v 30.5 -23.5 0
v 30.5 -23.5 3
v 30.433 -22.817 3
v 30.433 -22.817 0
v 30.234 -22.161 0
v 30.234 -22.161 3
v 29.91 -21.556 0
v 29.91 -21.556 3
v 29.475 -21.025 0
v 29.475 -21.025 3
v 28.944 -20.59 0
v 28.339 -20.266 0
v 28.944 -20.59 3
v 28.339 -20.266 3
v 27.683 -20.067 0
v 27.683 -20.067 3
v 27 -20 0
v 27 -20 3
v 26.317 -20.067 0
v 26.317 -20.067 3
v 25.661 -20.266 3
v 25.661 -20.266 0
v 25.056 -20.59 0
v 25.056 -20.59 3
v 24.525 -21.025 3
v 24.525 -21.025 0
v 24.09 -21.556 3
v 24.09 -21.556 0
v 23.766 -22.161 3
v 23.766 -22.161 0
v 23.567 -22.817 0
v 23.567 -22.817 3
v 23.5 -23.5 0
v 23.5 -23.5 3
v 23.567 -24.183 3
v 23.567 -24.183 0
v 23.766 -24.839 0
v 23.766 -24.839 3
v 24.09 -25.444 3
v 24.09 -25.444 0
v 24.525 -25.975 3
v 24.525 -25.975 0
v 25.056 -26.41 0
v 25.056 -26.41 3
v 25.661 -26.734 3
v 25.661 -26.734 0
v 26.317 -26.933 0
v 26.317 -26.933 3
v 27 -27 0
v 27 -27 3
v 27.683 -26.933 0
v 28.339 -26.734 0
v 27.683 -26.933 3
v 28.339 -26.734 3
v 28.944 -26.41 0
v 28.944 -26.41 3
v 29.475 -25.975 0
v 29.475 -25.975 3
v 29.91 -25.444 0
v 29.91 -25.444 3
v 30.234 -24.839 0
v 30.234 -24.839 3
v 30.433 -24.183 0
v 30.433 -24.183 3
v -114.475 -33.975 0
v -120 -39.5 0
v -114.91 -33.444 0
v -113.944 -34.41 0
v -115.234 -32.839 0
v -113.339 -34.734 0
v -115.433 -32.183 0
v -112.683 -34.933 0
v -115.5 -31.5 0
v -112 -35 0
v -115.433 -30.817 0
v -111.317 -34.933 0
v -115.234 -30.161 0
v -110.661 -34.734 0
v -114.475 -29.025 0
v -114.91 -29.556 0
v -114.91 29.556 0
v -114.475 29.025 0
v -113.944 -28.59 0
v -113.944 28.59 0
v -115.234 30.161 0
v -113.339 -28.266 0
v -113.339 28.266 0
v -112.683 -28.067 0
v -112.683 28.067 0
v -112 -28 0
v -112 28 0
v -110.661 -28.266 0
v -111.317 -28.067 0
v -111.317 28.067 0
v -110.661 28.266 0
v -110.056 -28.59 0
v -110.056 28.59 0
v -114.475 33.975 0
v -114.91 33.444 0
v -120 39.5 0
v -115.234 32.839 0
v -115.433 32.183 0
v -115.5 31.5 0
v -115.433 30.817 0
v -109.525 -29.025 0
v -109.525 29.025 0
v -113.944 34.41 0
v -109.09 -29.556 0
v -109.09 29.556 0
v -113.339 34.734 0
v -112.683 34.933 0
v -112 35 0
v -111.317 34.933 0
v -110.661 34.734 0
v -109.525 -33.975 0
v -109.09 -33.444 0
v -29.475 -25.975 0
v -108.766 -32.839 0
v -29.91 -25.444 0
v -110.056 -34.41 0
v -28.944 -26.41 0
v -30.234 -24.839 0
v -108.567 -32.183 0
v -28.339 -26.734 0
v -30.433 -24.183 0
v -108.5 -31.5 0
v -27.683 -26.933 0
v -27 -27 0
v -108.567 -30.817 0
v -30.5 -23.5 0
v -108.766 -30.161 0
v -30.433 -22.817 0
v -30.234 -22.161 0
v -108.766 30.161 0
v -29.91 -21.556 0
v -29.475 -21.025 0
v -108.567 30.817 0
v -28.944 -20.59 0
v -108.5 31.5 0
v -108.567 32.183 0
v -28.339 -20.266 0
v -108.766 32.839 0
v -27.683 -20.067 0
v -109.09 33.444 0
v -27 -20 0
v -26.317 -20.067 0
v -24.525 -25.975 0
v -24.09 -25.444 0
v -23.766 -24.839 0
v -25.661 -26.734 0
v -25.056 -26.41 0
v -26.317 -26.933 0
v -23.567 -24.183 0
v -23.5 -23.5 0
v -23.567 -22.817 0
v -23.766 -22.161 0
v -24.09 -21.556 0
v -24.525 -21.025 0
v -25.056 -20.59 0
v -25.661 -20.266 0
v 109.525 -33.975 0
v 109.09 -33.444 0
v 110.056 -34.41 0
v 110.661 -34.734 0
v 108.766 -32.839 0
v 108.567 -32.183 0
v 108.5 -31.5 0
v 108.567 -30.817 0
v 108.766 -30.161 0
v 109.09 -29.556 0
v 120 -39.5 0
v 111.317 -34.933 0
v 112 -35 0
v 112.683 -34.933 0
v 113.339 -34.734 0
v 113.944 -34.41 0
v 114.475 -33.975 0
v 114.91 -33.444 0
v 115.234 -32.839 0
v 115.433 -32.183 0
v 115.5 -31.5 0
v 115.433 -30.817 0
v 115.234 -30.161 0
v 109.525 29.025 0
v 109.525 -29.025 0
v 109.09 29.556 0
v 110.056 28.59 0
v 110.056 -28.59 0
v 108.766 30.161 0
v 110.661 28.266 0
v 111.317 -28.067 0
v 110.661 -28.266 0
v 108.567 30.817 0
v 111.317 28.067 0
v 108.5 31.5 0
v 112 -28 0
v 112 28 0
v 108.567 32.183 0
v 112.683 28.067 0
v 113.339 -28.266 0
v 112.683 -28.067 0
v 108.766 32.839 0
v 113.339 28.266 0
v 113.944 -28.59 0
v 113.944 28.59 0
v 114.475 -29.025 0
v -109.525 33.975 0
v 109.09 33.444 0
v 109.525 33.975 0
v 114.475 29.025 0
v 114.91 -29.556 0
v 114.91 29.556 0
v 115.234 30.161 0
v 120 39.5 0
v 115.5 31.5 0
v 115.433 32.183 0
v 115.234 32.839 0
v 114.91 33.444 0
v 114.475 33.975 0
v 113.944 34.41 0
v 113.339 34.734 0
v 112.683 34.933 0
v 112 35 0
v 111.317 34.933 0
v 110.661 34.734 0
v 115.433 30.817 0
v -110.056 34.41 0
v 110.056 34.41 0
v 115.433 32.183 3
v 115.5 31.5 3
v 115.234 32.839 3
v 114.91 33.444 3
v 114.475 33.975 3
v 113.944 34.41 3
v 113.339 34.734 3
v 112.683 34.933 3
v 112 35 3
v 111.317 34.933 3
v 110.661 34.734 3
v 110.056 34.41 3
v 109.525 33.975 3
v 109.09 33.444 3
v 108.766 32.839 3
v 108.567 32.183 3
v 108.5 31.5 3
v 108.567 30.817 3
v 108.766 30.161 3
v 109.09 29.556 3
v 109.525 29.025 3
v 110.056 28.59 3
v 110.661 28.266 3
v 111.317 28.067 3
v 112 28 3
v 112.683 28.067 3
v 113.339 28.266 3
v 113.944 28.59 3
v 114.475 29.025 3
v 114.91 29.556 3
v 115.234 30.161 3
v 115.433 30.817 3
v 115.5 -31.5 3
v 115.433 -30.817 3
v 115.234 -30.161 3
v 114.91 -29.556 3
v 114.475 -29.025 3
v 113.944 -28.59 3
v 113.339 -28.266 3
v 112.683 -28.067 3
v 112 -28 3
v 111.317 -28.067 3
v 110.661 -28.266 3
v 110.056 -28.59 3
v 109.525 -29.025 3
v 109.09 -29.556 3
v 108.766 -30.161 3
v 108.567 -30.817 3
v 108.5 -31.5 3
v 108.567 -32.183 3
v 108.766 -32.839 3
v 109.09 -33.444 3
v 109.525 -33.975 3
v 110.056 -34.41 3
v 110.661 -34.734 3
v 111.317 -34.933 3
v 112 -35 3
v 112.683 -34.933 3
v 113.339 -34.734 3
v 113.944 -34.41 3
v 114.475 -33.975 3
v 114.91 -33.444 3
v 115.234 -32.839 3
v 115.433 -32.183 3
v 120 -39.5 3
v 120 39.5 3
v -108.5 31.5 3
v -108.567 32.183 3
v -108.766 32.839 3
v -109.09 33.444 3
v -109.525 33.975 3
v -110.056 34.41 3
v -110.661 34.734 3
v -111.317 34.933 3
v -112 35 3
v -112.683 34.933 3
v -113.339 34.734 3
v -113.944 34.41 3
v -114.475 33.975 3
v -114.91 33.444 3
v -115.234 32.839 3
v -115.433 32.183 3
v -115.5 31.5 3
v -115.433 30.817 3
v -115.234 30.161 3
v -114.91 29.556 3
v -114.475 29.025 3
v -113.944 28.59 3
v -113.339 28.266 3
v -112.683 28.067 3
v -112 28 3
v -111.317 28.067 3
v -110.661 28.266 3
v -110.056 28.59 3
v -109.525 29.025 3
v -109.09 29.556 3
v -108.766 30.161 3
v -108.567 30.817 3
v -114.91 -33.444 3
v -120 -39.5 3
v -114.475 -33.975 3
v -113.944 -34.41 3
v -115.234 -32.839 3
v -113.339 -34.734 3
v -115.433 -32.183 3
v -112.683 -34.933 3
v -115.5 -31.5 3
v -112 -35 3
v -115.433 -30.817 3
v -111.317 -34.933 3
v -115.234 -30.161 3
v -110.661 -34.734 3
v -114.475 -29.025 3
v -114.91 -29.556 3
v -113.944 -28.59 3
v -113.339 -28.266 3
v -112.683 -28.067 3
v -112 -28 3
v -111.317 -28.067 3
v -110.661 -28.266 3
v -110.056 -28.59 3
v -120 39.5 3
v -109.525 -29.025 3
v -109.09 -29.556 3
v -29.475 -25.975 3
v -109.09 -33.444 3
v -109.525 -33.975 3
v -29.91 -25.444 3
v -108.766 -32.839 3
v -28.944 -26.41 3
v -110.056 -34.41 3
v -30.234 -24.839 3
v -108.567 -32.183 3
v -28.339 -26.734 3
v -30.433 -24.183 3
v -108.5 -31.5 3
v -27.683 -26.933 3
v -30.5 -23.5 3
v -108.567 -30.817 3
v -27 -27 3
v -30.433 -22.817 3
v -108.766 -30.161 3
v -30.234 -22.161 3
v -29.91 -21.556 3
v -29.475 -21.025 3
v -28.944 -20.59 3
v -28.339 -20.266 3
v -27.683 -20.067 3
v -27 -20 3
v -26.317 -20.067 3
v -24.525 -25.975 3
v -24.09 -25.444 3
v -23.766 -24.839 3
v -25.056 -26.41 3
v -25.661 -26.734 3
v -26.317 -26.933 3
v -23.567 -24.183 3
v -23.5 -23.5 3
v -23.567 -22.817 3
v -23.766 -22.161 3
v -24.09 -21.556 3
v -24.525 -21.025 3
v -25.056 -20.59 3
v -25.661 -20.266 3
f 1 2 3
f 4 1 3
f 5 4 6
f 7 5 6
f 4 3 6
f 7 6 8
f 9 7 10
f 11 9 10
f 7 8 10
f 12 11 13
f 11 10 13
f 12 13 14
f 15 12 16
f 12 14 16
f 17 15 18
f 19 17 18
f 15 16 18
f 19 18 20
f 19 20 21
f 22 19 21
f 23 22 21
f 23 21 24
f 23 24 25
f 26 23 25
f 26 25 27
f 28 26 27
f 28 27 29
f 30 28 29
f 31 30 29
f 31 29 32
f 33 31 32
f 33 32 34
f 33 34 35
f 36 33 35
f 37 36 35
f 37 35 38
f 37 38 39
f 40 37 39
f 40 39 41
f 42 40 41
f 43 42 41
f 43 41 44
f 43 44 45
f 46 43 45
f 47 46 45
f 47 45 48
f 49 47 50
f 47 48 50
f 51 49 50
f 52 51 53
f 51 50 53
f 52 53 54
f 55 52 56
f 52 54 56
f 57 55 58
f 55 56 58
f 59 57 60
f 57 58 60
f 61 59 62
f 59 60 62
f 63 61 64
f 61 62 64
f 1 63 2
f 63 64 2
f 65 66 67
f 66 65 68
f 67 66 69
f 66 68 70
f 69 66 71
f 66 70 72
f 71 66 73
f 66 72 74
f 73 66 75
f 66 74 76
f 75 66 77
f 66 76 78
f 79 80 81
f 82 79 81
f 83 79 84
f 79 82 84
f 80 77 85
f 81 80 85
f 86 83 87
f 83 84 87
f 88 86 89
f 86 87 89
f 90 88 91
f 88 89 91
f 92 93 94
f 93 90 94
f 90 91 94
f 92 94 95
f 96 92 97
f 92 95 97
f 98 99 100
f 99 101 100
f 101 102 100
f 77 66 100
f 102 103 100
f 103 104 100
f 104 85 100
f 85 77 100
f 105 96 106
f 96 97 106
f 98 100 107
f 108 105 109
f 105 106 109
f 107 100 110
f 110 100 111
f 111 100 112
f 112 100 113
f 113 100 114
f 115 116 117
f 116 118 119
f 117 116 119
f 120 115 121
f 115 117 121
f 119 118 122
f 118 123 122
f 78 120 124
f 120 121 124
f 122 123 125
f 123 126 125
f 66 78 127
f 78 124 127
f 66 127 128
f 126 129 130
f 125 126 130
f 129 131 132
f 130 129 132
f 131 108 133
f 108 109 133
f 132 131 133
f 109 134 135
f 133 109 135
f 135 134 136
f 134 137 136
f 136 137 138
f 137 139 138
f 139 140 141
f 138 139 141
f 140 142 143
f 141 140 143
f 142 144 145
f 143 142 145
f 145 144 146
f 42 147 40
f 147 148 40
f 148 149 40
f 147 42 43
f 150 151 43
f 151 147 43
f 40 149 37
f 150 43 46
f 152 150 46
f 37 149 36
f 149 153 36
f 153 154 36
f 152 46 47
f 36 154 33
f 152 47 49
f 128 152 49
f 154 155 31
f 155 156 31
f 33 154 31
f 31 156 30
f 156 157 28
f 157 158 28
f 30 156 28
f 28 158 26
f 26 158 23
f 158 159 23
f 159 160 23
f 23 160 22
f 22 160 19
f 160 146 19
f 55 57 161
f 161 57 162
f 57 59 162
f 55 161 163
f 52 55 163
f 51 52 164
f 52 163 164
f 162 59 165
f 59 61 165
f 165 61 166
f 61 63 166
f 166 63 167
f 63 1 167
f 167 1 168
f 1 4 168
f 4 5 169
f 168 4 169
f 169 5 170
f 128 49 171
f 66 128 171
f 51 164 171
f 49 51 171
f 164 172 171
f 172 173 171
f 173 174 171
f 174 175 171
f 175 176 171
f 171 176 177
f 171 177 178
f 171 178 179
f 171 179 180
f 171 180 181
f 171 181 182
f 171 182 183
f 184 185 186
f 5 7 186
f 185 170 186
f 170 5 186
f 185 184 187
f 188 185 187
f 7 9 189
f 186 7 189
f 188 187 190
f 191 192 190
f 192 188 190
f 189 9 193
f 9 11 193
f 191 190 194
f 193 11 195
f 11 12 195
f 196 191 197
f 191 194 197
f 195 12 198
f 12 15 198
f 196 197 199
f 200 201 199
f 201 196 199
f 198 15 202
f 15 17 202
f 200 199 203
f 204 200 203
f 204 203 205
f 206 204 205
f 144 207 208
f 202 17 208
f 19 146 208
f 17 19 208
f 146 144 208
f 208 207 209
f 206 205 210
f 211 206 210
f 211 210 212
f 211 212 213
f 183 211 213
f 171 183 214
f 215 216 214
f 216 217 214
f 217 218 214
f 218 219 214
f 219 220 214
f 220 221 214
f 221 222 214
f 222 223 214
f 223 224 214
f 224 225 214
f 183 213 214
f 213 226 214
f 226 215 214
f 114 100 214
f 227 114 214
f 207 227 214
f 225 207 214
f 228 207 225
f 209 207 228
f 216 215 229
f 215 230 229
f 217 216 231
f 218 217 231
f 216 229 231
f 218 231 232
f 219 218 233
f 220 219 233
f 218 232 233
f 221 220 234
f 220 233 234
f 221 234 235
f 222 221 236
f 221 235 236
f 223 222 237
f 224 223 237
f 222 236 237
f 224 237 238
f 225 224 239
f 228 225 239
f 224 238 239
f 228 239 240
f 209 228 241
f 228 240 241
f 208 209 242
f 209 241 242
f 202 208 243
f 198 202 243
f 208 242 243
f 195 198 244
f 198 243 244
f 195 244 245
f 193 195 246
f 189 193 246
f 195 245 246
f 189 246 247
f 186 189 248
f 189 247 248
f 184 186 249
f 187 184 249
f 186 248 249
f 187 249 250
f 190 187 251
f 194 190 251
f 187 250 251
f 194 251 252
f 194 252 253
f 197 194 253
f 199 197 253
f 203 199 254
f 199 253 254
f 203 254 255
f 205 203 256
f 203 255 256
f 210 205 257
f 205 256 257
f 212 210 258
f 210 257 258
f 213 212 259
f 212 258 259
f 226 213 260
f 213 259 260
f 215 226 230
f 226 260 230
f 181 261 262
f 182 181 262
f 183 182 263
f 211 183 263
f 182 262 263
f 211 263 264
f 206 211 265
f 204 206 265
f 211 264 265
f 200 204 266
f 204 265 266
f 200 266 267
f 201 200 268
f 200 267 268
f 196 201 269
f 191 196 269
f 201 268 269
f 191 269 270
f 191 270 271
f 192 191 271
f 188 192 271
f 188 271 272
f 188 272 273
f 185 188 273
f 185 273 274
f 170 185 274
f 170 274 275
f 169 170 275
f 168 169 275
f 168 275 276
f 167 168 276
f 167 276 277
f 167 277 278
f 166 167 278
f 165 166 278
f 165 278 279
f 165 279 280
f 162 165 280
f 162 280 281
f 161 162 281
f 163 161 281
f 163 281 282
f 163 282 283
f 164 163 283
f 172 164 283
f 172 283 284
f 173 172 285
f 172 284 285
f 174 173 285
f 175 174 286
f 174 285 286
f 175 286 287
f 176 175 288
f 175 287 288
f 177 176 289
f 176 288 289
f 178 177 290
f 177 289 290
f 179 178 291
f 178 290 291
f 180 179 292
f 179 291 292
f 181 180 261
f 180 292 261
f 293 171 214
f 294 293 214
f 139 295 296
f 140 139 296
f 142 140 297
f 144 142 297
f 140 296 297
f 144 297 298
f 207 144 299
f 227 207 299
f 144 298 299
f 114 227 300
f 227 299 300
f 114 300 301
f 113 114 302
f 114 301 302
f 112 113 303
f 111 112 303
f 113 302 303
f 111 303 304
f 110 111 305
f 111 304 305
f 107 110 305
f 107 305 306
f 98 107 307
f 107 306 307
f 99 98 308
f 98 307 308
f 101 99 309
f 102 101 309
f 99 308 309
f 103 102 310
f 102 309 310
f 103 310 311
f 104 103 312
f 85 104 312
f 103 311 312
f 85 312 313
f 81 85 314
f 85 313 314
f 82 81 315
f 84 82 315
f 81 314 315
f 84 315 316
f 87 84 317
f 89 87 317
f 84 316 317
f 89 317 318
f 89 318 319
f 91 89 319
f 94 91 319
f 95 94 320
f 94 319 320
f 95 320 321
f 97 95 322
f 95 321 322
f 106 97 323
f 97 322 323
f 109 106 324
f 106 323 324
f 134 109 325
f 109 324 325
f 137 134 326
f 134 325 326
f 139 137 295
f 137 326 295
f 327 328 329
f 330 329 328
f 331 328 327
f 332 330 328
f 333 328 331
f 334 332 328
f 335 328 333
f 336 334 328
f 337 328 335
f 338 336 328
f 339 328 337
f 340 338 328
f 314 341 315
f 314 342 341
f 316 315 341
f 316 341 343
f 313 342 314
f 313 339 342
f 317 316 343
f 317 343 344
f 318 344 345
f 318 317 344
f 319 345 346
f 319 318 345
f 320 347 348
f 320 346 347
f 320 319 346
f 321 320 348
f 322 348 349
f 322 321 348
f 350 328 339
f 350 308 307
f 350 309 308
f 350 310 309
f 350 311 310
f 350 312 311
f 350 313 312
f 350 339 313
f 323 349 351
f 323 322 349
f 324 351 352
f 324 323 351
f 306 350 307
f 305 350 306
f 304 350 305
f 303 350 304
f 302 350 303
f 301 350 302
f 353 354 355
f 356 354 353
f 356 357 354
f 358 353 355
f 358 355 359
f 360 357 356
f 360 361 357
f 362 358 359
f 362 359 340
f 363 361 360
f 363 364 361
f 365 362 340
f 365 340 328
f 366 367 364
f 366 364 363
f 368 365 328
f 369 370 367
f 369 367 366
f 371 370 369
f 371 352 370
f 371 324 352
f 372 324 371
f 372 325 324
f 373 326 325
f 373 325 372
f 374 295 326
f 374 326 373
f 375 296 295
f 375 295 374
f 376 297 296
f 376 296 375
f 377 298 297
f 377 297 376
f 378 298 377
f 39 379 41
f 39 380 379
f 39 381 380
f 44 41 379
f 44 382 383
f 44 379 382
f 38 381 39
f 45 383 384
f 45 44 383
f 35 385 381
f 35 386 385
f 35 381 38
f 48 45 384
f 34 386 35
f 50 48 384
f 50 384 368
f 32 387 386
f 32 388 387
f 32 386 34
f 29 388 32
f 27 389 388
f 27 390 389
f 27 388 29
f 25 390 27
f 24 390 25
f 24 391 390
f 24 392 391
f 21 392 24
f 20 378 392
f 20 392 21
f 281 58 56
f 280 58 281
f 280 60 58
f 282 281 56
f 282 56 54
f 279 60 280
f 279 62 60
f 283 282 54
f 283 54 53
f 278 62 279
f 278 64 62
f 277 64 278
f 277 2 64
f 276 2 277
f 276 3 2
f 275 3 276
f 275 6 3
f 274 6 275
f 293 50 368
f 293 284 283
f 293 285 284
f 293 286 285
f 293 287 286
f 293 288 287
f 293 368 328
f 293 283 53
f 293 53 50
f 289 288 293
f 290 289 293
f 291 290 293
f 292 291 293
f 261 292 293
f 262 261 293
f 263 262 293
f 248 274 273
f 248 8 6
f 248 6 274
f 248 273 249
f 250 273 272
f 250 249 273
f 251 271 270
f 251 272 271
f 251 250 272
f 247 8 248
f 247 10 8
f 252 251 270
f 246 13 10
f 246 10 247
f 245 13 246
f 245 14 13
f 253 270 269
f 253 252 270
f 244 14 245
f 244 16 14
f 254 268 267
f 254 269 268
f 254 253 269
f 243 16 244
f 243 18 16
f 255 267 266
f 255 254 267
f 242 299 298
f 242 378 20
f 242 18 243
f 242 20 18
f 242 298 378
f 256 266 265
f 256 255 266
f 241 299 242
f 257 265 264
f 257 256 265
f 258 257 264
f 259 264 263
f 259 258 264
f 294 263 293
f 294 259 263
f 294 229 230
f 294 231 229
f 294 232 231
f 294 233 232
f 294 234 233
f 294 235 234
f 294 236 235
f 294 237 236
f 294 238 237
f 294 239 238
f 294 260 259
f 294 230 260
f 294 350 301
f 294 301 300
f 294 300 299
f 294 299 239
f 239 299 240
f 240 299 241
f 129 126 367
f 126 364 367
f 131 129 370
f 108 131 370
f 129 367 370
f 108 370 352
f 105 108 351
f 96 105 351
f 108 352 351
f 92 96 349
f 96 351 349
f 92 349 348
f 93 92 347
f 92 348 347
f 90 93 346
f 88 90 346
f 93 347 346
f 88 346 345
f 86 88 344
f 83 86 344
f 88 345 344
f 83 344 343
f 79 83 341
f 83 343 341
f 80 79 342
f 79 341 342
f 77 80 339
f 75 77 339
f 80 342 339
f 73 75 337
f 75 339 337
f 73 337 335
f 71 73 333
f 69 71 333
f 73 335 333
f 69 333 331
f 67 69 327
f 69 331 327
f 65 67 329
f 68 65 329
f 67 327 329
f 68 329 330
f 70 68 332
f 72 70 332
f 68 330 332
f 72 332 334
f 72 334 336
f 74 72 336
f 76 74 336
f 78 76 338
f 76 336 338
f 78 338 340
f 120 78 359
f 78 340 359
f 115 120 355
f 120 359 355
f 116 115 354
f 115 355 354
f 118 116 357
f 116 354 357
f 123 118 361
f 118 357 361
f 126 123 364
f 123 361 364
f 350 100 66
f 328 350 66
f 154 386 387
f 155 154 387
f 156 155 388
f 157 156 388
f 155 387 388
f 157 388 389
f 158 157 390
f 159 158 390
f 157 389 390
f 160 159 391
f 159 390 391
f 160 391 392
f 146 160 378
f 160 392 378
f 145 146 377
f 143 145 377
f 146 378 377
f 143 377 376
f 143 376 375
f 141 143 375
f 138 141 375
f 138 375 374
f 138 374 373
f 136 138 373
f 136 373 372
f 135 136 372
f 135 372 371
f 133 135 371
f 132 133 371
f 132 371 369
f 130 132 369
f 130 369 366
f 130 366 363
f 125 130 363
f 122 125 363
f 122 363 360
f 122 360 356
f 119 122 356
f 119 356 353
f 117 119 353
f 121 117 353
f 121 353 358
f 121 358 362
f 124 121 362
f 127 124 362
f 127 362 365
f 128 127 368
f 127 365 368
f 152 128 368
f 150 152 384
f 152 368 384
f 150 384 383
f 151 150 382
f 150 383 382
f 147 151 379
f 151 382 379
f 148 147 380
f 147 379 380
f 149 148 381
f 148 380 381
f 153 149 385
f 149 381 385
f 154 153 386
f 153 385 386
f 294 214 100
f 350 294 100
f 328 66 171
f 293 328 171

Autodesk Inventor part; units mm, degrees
ref_plane "YZ Plane" through (0, 0, 0) normal (1, 0, 0) x (0, 1, 0)
ref_plane "XZ Plane" through (0, 0, 0) normal (0, 1, 0) x (-1, 0, 0)
ref_plane "XY Plane" through (0, 0, 0) normal (0, 0, 1) x (1, 0, 0)
sketch "Sketch66" plane through (0, 0, 0) normal (0, 0, 1) x (1, 0, 0)
  line L0 (-120, -39.5) -> (120, -39.5)
  line L1 (120, -39.5) -> (120, 39.5)
  line L2 (120, 39.5) -> (-120, 39.5)
  line L3 (-120, 39.5) -> (-120, -39.5)
  line L4 (-120, -39.5) -> (120, 39.5) construction
  line L5 (120, -39.5) -> (-120, 39.5) construction
  point P0 (0, 0)
  dimension "d179" = 240
  dimension "d180" = 79
extrude "Extrusion45" add sketch "Sketch66" along normal blind 3
sketch "Sketch68" plane through (0, 0, 3) normal (0, 0, 1) x (1, 0, 0)
  circle A0 centre (-112, 31.5) radius 3.5
  circle A1 centre (-112, -31.5) radius 3.5
  circle A2 centre (112, 31.5) radius 3.5
  circle A3 centre (112, -31.5) radius 3.5
  point P0 (0, 0)
  dimension "d186" = 7
  dimension "d187" = 7
  dimension "d188" = 7
  dimension "d189" = 7
extrude "Extrusion47" cut sketch "Sketch68" against normal through all
sketch "Sketch69" plane through (0, 0, 3) normal (0, 0, 1) x (1, 0, 0)
  circle A0 centre (-27, -23.5) radius 3.5
  circle A1 centre (27, -23.5) radius 3.5
  point P0 (0, 0)
  dimension "d192" = 7
  dimension "d193" = 7
extrude "Extrusion48" cut sketch "Sketch69" against normal through all
equation "\"d187\" = d186"
equation "\"d188\" = d186"
equation "\"d189\" = d186"
equation "\"d192\" = d186"
equation "\"d193\" = d186"
properties part number "magnet_test_print_v02"
